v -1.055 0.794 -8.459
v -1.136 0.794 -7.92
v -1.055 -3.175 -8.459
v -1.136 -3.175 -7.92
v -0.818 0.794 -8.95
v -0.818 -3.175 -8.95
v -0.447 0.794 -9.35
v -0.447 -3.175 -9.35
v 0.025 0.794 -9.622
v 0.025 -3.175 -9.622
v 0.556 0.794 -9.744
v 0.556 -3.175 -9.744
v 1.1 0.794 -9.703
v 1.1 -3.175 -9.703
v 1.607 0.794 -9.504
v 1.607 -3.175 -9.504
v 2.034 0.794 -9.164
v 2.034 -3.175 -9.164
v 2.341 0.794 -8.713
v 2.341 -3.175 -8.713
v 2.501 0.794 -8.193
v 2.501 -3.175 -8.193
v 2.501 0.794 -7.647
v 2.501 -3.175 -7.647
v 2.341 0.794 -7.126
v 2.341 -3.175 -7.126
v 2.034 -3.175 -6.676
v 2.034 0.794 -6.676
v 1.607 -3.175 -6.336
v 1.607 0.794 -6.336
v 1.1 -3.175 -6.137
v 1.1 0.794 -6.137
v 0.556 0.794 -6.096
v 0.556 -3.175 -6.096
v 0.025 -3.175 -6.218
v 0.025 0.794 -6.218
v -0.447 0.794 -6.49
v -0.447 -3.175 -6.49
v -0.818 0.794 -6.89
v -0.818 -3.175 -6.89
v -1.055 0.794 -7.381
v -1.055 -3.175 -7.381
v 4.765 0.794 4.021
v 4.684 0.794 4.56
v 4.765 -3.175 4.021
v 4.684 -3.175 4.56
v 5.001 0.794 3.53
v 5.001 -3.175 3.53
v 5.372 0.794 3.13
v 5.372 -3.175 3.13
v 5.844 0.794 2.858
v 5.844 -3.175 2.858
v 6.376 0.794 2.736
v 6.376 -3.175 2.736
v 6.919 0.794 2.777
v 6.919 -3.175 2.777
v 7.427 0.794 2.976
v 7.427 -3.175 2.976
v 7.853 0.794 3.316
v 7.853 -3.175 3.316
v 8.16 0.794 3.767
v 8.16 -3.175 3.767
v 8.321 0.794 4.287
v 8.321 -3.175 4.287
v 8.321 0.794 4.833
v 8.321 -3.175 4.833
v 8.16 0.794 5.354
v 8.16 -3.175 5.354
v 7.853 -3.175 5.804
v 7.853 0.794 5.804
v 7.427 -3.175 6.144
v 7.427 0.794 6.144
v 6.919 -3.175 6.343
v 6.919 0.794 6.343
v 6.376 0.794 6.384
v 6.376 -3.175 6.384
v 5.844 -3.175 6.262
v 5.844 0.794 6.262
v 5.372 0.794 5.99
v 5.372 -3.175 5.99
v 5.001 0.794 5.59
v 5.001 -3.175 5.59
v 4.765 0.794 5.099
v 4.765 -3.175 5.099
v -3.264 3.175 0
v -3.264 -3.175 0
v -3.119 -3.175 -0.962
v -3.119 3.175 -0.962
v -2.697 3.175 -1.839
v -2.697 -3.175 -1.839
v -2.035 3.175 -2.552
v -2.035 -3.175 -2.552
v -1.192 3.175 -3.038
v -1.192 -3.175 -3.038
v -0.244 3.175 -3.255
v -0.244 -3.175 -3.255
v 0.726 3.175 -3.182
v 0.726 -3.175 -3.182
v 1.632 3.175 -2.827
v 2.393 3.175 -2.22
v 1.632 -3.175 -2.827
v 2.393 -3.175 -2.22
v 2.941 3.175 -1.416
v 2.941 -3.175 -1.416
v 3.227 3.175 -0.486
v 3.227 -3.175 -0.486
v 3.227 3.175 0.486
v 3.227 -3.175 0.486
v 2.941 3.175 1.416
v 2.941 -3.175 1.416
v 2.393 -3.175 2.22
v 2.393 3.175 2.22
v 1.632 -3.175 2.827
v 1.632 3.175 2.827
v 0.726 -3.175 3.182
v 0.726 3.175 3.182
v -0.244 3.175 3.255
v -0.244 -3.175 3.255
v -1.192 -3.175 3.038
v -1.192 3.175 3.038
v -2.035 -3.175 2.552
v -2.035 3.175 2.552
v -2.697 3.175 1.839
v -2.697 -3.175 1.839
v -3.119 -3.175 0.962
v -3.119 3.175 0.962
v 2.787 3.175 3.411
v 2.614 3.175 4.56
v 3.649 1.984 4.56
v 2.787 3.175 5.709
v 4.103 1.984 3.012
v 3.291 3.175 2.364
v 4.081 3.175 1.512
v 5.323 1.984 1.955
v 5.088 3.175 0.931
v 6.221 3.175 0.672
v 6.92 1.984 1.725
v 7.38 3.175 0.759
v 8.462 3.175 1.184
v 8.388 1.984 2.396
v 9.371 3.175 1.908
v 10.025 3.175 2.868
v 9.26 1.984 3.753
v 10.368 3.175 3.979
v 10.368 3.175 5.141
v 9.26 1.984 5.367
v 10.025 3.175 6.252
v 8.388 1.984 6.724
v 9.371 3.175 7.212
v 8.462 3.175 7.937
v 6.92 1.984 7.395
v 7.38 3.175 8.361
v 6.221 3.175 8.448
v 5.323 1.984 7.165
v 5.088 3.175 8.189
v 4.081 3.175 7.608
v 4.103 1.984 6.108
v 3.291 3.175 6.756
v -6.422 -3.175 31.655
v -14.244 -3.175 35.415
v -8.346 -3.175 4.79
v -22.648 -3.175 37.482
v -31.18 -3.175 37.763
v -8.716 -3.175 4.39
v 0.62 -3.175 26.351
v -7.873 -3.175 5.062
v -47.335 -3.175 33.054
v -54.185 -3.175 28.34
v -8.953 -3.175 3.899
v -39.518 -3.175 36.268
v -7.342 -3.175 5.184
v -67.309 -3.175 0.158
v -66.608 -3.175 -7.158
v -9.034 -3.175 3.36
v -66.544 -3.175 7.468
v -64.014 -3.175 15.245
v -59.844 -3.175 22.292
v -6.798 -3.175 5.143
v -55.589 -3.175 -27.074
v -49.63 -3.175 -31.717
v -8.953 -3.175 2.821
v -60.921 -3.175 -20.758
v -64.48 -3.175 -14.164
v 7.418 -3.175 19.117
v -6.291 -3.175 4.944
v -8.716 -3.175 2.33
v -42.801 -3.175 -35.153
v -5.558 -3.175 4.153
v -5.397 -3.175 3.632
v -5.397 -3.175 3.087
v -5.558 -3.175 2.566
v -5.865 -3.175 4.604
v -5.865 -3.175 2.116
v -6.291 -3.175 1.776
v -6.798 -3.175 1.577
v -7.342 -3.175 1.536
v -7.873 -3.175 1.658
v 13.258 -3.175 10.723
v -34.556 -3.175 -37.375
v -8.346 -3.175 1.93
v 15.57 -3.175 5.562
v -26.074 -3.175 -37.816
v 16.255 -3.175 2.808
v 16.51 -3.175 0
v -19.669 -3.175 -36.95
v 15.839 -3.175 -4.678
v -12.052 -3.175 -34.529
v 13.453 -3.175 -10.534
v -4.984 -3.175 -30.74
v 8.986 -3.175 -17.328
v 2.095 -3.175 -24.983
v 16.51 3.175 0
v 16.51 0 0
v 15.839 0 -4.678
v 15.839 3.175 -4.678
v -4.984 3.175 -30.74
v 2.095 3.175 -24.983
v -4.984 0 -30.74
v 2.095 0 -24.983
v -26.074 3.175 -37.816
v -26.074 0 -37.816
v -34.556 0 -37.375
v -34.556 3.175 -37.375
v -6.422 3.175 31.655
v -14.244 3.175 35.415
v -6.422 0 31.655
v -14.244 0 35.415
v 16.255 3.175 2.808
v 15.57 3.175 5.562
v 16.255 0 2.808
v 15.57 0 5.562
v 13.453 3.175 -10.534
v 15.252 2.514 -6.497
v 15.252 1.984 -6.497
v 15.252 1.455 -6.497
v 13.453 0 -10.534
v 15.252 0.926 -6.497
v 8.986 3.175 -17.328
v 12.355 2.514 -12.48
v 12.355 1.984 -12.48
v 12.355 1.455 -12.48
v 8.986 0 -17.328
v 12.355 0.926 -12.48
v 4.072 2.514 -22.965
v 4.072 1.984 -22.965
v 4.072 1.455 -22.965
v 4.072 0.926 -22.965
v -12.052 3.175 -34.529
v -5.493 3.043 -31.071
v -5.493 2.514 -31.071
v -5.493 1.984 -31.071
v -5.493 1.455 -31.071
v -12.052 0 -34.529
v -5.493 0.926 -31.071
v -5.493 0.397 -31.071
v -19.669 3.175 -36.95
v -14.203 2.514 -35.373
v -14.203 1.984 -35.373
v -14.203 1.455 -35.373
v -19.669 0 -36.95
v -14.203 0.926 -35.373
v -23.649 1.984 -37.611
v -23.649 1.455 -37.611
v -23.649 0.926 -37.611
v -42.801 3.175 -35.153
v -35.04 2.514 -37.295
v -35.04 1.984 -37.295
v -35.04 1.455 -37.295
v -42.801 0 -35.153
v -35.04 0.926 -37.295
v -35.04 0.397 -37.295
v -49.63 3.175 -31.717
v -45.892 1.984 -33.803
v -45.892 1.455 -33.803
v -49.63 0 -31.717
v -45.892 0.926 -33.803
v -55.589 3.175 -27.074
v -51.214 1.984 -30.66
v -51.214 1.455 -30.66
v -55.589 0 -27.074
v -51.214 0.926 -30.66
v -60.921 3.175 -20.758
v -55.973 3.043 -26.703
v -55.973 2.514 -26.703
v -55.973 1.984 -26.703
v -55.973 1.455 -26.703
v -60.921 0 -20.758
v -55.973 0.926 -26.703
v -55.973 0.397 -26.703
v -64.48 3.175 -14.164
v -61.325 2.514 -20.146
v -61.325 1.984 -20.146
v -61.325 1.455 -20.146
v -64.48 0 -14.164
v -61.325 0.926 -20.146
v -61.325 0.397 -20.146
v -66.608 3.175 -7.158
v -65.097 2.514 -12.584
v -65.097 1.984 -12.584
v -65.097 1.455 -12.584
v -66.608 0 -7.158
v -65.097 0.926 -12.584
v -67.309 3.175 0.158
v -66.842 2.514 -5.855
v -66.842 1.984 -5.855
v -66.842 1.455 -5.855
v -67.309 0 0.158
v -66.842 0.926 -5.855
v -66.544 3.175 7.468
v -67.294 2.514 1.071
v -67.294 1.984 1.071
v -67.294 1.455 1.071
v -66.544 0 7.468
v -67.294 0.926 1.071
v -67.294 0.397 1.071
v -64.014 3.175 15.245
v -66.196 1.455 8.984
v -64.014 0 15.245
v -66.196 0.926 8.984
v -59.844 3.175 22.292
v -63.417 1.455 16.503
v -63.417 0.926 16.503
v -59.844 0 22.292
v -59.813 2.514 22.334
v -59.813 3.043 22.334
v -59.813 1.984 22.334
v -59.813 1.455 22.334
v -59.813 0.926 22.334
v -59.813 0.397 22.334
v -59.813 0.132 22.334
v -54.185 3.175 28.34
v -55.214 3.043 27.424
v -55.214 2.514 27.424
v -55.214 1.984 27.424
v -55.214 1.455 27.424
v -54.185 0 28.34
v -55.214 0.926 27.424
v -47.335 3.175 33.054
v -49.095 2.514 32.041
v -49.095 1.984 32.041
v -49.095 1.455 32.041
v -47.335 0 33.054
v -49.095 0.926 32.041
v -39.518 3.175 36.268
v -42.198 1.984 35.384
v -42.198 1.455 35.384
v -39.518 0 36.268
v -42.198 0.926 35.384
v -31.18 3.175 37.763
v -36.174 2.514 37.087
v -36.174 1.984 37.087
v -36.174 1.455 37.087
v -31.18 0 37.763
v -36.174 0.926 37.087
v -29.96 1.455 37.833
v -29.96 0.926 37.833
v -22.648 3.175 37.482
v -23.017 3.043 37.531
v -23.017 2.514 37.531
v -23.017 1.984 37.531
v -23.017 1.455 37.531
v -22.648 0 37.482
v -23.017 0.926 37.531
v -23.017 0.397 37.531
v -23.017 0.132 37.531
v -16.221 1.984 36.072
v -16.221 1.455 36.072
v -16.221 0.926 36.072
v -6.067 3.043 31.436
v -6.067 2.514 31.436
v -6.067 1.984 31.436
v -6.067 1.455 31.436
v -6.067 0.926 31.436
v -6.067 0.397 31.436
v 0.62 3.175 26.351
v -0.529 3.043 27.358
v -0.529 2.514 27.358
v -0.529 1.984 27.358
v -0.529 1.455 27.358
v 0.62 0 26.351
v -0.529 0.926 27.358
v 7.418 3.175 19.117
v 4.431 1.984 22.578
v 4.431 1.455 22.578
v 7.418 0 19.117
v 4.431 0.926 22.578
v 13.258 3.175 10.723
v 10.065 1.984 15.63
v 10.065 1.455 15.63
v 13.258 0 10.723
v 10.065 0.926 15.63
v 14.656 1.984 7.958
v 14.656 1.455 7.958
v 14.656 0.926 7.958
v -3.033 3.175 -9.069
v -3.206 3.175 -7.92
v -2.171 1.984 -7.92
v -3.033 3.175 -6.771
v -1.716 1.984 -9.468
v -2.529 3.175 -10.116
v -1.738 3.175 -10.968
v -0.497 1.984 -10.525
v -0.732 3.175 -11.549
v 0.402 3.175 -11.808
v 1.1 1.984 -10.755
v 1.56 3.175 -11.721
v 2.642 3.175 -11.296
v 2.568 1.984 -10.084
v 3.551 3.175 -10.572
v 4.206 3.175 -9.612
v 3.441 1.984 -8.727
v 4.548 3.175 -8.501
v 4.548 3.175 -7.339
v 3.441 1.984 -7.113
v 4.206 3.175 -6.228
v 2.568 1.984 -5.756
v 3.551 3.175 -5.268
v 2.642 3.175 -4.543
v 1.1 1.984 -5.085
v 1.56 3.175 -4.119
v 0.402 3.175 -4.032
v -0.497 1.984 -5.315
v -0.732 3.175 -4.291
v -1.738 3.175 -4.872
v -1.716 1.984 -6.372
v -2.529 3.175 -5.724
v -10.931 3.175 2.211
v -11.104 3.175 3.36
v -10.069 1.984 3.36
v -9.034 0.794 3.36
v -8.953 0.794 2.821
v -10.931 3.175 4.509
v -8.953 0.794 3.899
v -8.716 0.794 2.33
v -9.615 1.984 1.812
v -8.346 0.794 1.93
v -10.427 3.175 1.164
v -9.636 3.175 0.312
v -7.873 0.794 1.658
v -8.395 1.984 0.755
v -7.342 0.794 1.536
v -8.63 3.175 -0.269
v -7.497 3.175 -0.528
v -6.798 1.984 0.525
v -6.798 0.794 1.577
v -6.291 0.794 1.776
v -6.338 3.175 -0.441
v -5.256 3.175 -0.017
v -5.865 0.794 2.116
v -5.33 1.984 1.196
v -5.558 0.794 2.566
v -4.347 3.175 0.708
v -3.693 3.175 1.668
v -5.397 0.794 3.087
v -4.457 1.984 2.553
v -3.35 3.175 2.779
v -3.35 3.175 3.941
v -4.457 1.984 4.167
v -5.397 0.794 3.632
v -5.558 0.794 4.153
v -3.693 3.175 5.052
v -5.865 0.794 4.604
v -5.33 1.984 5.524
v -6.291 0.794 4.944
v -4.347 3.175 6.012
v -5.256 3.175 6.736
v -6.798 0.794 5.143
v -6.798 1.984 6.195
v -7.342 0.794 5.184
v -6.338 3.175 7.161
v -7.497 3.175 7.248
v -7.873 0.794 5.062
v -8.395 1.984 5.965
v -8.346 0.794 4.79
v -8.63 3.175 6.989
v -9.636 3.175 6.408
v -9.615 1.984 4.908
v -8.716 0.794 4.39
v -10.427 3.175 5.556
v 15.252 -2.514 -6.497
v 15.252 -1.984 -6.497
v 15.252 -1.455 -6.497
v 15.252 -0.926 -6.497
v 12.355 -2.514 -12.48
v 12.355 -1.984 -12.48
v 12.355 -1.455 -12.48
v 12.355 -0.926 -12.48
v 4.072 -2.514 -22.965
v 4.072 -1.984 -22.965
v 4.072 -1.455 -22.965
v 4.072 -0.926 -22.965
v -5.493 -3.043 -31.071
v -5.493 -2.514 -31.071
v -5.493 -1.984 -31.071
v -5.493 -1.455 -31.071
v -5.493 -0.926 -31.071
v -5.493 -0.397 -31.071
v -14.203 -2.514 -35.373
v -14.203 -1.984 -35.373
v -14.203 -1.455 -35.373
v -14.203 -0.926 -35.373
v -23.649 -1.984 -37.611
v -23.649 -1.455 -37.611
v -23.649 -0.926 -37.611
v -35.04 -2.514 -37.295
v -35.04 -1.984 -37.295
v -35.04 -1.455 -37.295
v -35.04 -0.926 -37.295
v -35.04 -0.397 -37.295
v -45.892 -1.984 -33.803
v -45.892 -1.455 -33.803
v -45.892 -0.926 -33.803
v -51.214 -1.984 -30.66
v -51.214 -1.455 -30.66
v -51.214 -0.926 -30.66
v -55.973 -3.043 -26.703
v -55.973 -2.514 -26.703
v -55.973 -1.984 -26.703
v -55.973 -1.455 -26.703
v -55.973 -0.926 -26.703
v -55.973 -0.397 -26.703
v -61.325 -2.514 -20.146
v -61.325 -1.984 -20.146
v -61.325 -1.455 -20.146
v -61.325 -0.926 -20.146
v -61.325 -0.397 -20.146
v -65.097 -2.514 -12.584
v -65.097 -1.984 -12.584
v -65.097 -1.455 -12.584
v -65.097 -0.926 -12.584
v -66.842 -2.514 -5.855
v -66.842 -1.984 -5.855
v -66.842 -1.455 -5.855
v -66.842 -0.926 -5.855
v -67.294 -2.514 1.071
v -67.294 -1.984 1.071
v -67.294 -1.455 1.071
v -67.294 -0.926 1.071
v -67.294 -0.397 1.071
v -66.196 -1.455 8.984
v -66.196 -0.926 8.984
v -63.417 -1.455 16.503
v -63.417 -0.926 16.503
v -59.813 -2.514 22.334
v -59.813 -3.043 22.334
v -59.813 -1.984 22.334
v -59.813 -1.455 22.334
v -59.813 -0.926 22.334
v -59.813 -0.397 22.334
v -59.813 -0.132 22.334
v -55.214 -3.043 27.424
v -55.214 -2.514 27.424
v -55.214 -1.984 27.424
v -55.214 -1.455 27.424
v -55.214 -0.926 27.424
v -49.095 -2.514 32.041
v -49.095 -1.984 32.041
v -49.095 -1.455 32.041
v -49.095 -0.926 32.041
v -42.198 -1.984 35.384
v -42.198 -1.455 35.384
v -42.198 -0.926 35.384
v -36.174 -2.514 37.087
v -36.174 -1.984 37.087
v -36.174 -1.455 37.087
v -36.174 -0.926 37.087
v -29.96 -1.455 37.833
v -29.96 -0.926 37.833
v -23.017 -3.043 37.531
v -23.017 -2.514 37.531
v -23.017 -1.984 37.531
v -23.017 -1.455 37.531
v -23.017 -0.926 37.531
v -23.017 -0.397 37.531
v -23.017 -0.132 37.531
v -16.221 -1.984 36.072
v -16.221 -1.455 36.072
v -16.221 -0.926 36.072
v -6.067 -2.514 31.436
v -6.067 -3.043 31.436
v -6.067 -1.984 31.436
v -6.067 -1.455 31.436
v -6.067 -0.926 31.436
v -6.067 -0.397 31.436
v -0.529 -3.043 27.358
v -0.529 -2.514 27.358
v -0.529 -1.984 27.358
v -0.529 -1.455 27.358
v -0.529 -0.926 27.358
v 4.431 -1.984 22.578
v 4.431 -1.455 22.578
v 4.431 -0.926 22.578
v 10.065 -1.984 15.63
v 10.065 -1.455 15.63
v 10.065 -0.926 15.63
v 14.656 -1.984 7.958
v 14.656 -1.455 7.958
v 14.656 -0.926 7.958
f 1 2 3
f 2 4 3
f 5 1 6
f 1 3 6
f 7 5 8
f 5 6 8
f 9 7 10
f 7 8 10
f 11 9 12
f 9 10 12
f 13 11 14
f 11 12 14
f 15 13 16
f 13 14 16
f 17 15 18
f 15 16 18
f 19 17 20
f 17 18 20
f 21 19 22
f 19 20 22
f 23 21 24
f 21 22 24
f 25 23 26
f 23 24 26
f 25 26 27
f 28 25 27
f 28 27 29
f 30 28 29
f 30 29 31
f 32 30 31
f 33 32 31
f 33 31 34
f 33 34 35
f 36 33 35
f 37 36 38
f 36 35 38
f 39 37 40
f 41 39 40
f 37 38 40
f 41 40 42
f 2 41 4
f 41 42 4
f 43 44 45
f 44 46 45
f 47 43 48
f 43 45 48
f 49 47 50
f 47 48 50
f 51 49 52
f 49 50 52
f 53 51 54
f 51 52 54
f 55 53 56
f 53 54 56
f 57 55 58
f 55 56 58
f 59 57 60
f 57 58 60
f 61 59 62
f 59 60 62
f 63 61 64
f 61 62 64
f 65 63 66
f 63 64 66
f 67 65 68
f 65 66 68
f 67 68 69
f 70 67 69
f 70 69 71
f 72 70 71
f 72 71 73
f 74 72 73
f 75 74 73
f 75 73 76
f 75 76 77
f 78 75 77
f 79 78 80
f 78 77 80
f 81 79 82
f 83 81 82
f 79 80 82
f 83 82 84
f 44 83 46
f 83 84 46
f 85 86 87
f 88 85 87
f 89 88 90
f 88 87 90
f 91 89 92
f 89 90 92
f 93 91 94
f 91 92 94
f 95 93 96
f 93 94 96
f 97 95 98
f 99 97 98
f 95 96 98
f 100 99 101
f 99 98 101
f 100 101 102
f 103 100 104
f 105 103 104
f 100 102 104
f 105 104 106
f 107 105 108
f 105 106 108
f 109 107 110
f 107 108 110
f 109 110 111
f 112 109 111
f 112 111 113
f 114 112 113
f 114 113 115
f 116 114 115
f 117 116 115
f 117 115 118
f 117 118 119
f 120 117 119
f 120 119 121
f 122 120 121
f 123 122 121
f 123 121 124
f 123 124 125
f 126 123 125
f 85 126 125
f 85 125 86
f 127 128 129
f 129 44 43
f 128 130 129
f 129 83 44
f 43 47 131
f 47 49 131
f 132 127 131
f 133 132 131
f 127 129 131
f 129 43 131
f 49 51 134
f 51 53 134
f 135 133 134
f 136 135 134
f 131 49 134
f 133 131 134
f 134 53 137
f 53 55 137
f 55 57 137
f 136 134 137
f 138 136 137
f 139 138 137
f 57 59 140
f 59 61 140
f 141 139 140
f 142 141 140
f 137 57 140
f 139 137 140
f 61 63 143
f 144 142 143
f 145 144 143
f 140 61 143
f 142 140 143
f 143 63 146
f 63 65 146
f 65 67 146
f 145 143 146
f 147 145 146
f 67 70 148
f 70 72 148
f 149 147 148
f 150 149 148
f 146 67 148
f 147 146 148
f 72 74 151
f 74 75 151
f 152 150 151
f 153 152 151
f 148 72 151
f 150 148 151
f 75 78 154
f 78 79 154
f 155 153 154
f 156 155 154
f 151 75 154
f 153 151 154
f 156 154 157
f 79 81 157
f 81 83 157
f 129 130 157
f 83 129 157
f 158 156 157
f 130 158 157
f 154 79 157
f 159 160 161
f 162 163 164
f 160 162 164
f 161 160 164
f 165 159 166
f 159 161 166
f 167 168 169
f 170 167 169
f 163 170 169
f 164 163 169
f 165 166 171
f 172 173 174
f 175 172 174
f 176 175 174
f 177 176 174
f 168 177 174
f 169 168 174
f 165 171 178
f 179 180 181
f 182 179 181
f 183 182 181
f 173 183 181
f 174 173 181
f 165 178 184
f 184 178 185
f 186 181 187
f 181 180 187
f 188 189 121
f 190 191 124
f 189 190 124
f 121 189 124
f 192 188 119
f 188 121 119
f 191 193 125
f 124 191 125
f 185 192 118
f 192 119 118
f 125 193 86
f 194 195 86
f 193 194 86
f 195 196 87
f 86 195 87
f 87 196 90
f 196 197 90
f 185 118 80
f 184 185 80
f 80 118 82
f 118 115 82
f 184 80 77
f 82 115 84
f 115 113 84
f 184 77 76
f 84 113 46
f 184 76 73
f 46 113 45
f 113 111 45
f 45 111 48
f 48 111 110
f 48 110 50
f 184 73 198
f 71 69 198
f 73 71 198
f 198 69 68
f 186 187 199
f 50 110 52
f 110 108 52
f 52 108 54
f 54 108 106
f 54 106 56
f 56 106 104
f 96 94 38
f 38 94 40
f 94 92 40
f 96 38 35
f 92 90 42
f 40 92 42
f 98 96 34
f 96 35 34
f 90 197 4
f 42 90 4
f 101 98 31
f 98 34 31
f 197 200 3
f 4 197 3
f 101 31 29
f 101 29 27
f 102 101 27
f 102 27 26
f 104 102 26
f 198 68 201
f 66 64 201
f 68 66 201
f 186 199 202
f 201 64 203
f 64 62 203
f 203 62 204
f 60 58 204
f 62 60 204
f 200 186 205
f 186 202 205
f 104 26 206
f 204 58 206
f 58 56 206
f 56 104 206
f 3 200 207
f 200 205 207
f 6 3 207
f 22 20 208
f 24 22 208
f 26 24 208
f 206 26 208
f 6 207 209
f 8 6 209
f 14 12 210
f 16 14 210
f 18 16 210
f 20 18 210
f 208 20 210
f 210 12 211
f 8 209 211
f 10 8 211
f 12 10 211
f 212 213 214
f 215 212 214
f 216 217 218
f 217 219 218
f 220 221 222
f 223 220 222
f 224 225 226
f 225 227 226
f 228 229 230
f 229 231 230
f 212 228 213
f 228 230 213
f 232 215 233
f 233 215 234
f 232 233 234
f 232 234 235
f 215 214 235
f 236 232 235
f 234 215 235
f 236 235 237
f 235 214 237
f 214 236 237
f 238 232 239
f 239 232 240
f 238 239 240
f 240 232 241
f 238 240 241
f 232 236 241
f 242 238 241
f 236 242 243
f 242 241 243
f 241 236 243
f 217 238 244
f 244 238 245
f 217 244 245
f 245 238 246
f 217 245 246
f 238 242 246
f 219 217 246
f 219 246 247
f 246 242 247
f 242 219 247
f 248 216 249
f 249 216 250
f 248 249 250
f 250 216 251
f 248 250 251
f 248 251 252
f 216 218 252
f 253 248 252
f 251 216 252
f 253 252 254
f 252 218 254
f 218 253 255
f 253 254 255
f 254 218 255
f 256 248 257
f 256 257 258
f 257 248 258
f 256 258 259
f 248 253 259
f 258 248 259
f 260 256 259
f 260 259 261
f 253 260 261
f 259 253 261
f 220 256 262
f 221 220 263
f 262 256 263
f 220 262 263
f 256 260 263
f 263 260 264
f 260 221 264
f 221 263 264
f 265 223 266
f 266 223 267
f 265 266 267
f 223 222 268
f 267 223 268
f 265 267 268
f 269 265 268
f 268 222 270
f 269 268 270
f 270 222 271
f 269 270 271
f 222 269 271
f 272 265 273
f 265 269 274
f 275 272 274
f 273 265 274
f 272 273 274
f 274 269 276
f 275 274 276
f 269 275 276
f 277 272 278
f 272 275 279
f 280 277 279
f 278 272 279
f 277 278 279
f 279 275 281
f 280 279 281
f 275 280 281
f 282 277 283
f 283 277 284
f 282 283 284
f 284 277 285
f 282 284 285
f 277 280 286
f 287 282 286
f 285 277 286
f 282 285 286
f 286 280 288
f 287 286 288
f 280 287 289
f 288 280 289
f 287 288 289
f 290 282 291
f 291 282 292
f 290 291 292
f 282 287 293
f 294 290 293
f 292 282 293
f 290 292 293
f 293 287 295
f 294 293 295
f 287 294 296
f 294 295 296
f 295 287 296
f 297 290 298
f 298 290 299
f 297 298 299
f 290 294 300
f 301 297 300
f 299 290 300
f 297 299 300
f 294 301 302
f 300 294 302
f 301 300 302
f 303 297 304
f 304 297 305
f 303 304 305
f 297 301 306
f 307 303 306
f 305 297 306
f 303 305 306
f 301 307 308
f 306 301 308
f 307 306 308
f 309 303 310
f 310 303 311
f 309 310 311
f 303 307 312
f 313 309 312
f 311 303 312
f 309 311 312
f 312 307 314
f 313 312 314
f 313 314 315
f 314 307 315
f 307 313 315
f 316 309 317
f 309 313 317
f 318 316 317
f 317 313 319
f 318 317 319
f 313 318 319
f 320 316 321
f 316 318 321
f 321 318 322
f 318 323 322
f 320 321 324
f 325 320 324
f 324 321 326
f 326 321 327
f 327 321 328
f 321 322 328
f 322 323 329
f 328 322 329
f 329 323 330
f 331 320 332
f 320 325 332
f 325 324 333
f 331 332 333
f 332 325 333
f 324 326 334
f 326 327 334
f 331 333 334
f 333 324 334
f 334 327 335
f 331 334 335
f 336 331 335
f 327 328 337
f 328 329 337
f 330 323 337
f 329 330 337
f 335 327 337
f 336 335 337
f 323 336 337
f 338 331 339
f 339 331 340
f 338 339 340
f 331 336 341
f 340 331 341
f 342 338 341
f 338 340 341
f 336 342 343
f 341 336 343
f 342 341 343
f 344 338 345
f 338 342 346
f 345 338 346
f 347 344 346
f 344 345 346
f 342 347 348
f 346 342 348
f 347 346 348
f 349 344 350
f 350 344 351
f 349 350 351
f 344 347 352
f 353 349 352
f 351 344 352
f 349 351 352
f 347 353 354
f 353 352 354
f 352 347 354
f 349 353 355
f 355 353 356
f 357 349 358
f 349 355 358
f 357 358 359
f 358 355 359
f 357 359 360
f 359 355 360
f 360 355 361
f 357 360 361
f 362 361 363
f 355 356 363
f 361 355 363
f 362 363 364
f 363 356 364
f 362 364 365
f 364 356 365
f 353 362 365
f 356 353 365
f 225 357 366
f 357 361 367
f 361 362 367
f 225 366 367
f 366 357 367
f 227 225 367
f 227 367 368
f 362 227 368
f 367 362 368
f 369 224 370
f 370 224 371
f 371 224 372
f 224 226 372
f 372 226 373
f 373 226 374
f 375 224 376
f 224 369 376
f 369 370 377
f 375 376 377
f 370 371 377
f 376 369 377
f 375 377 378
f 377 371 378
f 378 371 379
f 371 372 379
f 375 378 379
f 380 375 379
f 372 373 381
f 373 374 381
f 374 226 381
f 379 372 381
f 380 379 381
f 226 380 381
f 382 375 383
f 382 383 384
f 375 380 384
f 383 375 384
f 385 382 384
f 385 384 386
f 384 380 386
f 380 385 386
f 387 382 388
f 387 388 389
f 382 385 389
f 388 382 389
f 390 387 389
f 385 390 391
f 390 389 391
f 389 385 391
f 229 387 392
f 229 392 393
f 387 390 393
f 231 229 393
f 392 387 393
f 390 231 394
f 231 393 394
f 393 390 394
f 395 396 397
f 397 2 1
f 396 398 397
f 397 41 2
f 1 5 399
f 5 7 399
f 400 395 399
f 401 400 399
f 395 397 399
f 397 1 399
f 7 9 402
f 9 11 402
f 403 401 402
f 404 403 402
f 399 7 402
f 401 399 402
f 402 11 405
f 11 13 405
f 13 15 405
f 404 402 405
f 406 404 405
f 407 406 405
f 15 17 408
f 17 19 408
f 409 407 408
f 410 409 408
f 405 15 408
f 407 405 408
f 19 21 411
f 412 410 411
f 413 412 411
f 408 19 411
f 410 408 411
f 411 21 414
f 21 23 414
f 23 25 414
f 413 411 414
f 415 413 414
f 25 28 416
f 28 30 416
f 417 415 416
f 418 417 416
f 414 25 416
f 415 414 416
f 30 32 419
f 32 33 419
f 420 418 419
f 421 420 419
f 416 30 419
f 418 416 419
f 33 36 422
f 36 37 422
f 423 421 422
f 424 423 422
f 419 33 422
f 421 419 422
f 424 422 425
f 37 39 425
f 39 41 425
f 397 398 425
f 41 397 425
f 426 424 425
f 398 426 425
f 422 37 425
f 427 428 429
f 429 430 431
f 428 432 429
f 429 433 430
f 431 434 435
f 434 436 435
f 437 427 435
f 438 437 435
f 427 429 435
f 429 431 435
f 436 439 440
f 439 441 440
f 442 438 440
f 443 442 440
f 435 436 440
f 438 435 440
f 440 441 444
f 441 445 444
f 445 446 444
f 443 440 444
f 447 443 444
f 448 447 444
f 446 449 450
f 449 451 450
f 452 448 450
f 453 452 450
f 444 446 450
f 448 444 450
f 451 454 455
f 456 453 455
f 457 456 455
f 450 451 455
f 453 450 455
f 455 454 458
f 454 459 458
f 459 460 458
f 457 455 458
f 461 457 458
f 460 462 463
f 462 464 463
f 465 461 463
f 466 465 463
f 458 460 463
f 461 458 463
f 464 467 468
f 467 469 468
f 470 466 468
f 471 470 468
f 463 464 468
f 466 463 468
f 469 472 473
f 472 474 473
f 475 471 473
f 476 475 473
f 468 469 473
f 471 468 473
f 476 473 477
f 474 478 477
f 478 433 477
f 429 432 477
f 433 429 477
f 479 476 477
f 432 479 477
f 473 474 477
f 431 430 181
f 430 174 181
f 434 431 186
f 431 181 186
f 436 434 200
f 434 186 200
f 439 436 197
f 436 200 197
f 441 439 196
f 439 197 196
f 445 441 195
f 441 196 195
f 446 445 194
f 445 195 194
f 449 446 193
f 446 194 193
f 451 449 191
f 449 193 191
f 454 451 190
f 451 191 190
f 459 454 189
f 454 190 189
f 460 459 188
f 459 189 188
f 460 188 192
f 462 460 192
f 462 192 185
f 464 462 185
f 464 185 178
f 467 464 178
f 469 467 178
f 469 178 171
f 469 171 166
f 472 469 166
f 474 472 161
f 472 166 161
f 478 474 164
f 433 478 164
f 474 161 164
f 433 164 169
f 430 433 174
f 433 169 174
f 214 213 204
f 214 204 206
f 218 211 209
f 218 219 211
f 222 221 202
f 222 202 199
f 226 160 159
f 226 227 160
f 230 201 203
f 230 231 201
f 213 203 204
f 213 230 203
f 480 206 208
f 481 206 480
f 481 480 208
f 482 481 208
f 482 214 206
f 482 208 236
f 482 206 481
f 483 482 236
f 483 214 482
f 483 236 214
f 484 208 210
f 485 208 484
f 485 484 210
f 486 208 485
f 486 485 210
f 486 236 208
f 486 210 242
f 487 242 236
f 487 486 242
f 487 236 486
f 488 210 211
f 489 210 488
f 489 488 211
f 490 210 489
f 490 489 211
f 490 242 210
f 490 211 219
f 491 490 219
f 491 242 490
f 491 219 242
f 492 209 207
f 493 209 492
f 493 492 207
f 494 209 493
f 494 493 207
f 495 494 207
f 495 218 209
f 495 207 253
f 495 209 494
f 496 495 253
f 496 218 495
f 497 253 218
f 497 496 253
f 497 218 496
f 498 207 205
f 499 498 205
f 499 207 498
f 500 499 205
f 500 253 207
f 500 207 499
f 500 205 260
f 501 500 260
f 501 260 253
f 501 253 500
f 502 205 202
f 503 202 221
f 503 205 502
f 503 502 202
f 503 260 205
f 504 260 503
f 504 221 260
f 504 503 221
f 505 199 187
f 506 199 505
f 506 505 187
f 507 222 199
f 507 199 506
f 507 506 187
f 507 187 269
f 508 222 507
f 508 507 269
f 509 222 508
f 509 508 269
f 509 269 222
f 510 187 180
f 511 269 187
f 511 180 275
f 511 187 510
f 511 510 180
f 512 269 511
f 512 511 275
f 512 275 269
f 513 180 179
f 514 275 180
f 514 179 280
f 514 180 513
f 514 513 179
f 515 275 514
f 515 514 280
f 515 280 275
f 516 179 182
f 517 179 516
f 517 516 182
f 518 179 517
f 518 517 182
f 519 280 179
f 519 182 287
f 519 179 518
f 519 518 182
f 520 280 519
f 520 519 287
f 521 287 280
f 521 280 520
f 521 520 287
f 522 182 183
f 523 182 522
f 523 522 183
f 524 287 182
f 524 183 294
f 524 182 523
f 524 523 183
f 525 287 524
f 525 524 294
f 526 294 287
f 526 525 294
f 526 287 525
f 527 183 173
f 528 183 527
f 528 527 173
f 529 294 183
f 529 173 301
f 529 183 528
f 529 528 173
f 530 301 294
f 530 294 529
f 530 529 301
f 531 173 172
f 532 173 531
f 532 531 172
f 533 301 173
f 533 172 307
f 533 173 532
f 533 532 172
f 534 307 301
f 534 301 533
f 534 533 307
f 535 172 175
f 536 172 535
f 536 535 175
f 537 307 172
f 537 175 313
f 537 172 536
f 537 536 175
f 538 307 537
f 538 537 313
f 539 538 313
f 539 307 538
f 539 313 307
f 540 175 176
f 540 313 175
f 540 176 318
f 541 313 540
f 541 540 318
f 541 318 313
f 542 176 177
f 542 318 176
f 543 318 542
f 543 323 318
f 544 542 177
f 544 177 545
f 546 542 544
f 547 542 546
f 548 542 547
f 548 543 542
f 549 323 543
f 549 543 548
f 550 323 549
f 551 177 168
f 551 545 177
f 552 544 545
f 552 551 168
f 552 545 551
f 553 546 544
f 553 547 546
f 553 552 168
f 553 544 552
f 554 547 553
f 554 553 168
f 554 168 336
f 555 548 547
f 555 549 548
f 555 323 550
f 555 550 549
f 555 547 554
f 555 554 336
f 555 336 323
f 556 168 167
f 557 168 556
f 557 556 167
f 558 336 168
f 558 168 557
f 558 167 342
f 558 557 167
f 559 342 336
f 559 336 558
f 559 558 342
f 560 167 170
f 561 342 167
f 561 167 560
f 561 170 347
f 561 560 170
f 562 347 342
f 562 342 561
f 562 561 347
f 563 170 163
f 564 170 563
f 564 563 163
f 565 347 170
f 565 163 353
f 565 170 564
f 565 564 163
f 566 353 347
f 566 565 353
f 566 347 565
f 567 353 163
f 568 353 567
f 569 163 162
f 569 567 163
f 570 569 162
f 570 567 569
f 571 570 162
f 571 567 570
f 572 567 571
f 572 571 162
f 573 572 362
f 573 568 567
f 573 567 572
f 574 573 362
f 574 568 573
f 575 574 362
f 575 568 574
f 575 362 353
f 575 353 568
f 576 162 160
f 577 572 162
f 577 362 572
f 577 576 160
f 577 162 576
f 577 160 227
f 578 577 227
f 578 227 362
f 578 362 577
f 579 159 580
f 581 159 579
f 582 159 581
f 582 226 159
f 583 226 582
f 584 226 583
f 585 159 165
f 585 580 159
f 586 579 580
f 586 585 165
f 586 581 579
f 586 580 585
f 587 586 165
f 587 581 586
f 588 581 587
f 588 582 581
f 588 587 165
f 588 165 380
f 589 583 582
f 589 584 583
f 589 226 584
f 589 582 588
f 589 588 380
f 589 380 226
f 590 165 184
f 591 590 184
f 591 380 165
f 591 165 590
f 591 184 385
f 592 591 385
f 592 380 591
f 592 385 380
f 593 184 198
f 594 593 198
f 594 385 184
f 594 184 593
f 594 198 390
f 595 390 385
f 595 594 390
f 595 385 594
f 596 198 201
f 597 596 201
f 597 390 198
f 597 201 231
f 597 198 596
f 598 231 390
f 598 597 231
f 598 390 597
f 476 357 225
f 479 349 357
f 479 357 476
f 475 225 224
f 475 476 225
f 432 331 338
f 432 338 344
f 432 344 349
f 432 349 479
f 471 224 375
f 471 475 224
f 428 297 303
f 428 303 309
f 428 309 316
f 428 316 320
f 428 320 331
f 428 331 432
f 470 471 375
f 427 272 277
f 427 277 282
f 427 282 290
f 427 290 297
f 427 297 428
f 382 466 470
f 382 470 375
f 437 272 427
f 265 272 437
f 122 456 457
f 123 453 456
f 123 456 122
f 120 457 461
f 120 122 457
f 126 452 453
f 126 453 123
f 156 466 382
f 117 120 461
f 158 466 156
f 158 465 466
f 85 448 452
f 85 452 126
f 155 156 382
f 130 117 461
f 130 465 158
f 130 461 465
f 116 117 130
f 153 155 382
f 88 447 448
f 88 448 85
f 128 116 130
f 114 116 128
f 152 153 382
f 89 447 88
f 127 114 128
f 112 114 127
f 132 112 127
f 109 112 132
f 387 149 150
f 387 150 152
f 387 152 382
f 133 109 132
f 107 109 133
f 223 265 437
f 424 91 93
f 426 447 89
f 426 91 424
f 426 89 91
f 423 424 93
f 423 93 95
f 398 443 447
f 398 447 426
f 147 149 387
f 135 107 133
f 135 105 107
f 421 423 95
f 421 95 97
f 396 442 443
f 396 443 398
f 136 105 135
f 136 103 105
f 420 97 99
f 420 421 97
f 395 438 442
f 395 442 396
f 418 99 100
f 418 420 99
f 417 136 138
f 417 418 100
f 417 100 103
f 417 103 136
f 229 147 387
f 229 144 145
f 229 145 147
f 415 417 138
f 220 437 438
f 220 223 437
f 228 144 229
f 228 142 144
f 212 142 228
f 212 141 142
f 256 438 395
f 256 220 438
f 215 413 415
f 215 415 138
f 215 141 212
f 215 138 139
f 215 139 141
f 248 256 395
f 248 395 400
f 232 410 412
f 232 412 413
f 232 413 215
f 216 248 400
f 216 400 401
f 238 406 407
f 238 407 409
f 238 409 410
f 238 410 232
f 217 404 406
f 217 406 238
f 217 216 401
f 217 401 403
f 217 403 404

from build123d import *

# Parameters (mm, degrees)
BOSS_EXTRUDE1_DEPTH                               = 3.175
CSK_FOR_6_FLAT_HEAD_SOCKET_CAP_SCREW1_D           = 3.6576
CSK_FOR_6_FLAT_HEAD_SOCKET_CAP_SCREW1_CSINK_D     = 7.7978
CSK_FOR_6_FLAT_HEAD_SOCKET_CAP_SCREW1_CSINK_ANGLE = 82
F_0_257_DIAMETER_HOLE1_D                          = 6.5278


with BuildPart() as part:
    # Sketch4 → Boss-Extrude1 (new body, symmetric)
    with BuildSketch(Plane(origin=(0, 0, 0), x_dir=(1, 0, 0), z_dir=(0, 1, 0))):
        with BuildLine():
            add(Edge.make_bspline(
                [(16.51, 0), (16.512122003, 0.578131647), (16.384658392, 2.985986119), (13.900823918, 11.605758021), (7.810988154, 19.155439574), (0.397856737, 26.753696185), (-7.914709507, 33.453659054), (-20.809856563, 38.186828505), (-34.987409766, 37.85110508), (-46.326695461, 34.282389834), (-57.678006204, 26.336334922), (-64.582391021, 15.700922663), (-66.82228974, 6.758220231), (-67.294278308, 2.143947914), (-67.345909791, -1.429507135), (-66.789369182, -7.815377649), (-63.775863211, -17.415888088), (-55.452256085, -28.466700541), (-43.340466422, -35.829299708), (-29.536622908, -38.571691931), (-16.891586538, -36.932845951), (-5.017956328, -31.482256467), (3.946482544, -23.64766657), (10.468427119, -15.339754563), (15.082180852, -7.959390649), (16.499996307, -2.725468654), (16.51, 0)],
                knots=[0, 0, 0, 0, 0.007033379, 0.029286372, 0.107768427, 0.121103965, 0.158717658, 0.23702597, 0.281652422, 0.329525955, 0.379560175, 0.447772761, 0.478100162, 0.491134389, 0.504172012, 0.521547706, 0.569036322, 0.624460034, 0.686374732, 0.737017154, 0.793225001, 0.838519217, 0.894255247, 0.936255108, 0.966842753, 1, 1, 1, 1], degree=3))
        make_face()
    extrude(amount=BOSS_EXTRUDE1_DEPTH, both=True)

    # CSK for #6 Flat Head Socket Cap Screw1 (through all)
    with Locations(Plane(origin=(0, 3.175, 0), x_dir=(1, 0, 0), z_dir=(0, 1, 0))):
        with Locations((0.692905586, 7.919947089), (6.512422583, -4.560047384), (-7.205328168, -3.359899704)):
            CounterSinkHole(CSK_FOR_6_FLAT_HEAD_SOCKET_CAP_SCREW1_D / 2, CSK_FOR_6_FLAT_HEAD_SOCKET_CAP_SCREW1_CSINK_D / 2, counter_sink_angle=CSK_FOR_6_FLAT_HEAD_SOCKET_CAP_SCREW1_CSINK_ANGLE)

    # F (0.257) Diameter Hole1 (through all)
    with Locations(Plane(origin=(0, 3.175, 0), x_dir=(1, 0, 0), z_dir=(0, 1, 0))):
        with Locations((0, 0)):
            Hole(F_0_257_DIAMETER_HOLE1_D / 2)


solid = part.part
